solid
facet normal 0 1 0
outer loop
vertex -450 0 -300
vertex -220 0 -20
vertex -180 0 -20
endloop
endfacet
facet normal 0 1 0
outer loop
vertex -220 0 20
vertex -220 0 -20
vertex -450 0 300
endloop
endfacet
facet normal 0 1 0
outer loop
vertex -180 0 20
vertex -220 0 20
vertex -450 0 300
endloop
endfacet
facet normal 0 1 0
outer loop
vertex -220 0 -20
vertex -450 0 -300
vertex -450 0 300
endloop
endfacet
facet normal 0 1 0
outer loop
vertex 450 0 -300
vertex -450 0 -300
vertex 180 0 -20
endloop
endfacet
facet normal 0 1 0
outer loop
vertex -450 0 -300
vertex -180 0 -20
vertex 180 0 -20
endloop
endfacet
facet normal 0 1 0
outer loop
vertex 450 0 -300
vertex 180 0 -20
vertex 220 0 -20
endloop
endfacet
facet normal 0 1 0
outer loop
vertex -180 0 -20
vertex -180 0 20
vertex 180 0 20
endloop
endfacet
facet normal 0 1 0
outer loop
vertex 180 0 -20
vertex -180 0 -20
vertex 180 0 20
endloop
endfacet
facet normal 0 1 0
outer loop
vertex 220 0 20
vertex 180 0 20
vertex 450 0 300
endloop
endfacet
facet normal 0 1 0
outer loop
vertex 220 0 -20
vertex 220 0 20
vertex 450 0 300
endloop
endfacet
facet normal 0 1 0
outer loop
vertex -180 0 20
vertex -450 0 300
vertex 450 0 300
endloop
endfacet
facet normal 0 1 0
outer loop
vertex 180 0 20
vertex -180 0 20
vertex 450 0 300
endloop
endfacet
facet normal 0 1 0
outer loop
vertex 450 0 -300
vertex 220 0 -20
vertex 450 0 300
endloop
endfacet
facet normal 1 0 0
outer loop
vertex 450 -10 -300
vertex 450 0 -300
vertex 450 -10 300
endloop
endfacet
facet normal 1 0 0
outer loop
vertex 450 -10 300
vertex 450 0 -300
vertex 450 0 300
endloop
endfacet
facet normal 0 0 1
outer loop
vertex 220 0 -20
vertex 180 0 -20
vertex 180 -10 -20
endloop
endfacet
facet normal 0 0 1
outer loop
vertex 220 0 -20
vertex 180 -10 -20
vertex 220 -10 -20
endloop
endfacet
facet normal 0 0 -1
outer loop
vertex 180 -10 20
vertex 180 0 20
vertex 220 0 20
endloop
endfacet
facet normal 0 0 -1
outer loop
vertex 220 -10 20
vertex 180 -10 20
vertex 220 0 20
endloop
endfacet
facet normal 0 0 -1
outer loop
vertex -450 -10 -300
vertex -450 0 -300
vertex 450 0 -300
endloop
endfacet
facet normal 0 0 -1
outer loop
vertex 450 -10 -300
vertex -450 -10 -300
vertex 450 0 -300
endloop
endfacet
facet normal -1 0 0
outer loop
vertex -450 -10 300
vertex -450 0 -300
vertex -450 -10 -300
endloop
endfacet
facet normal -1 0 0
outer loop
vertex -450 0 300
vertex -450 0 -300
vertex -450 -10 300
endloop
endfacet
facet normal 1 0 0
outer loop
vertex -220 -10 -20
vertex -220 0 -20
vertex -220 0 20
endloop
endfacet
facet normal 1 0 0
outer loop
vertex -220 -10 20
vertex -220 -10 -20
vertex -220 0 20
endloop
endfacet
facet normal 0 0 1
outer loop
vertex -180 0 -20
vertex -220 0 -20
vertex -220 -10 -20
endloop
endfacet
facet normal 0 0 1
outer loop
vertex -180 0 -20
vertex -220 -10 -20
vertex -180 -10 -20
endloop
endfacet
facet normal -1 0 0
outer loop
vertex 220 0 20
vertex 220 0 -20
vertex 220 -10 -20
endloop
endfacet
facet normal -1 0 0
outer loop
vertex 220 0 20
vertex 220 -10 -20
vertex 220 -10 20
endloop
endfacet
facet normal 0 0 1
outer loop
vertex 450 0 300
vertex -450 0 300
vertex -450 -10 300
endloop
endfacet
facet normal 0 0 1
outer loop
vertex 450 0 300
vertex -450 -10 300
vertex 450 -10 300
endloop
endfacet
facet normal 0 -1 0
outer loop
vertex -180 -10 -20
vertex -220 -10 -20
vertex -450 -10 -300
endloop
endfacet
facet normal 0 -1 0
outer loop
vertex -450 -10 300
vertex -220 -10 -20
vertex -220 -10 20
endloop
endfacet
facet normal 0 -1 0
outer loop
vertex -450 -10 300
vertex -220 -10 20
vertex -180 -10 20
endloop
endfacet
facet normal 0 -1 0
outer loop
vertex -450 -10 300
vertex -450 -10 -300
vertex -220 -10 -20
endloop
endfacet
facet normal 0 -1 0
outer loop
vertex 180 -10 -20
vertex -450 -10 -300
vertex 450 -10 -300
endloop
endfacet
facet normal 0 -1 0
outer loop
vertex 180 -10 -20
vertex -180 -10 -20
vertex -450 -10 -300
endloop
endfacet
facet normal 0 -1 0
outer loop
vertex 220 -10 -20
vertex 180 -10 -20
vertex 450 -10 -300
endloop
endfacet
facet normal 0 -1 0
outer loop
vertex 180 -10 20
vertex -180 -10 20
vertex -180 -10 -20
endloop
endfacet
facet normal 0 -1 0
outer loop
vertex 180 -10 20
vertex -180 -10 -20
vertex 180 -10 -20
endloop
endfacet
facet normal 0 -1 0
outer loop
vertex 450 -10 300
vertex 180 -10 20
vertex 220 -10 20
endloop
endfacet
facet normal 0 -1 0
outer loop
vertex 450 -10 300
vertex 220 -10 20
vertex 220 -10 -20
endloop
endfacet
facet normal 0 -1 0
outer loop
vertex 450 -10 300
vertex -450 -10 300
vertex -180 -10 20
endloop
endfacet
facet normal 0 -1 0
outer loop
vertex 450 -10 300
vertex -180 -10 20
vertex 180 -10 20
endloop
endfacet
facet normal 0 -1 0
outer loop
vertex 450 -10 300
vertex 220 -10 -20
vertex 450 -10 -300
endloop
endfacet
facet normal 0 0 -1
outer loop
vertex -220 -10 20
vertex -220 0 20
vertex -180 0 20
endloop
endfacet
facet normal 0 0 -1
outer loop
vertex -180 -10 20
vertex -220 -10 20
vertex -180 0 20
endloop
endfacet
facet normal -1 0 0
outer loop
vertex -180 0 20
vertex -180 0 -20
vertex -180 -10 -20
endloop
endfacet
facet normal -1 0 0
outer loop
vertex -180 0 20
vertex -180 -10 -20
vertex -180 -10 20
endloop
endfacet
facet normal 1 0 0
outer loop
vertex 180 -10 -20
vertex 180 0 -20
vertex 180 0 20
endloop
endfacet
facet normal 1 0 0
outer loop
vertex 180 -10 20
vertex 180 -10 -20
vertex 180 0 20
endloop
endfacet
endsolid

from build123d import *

# Parameters (mm, degrees)
SKETCH_W   = 900
SKETCH_H   = 600
SKETCH_W_2 = 40
SKETCH_H_2 = 40
PAD_DEPTH  = 10


with BuildPart() as part:
    # Sketch → Pad (new body)
    with BuildSketch(Plane.XZ):
        Rectangle(SKETCH_W, SKETCH_H)
        with Locations((-200, 0)):
            Rectangle(SKETCH_W_2, SKETCH_H_2, mode=Mode.SUBTRACT)
        with Locations((200, 0)):
            Rectangle(SKETCH_W_2, SKETCH_H_2, mode=Mode.SUBTRACT)
    extrude(amount=PAD_DEPTH)


solid = part.part
